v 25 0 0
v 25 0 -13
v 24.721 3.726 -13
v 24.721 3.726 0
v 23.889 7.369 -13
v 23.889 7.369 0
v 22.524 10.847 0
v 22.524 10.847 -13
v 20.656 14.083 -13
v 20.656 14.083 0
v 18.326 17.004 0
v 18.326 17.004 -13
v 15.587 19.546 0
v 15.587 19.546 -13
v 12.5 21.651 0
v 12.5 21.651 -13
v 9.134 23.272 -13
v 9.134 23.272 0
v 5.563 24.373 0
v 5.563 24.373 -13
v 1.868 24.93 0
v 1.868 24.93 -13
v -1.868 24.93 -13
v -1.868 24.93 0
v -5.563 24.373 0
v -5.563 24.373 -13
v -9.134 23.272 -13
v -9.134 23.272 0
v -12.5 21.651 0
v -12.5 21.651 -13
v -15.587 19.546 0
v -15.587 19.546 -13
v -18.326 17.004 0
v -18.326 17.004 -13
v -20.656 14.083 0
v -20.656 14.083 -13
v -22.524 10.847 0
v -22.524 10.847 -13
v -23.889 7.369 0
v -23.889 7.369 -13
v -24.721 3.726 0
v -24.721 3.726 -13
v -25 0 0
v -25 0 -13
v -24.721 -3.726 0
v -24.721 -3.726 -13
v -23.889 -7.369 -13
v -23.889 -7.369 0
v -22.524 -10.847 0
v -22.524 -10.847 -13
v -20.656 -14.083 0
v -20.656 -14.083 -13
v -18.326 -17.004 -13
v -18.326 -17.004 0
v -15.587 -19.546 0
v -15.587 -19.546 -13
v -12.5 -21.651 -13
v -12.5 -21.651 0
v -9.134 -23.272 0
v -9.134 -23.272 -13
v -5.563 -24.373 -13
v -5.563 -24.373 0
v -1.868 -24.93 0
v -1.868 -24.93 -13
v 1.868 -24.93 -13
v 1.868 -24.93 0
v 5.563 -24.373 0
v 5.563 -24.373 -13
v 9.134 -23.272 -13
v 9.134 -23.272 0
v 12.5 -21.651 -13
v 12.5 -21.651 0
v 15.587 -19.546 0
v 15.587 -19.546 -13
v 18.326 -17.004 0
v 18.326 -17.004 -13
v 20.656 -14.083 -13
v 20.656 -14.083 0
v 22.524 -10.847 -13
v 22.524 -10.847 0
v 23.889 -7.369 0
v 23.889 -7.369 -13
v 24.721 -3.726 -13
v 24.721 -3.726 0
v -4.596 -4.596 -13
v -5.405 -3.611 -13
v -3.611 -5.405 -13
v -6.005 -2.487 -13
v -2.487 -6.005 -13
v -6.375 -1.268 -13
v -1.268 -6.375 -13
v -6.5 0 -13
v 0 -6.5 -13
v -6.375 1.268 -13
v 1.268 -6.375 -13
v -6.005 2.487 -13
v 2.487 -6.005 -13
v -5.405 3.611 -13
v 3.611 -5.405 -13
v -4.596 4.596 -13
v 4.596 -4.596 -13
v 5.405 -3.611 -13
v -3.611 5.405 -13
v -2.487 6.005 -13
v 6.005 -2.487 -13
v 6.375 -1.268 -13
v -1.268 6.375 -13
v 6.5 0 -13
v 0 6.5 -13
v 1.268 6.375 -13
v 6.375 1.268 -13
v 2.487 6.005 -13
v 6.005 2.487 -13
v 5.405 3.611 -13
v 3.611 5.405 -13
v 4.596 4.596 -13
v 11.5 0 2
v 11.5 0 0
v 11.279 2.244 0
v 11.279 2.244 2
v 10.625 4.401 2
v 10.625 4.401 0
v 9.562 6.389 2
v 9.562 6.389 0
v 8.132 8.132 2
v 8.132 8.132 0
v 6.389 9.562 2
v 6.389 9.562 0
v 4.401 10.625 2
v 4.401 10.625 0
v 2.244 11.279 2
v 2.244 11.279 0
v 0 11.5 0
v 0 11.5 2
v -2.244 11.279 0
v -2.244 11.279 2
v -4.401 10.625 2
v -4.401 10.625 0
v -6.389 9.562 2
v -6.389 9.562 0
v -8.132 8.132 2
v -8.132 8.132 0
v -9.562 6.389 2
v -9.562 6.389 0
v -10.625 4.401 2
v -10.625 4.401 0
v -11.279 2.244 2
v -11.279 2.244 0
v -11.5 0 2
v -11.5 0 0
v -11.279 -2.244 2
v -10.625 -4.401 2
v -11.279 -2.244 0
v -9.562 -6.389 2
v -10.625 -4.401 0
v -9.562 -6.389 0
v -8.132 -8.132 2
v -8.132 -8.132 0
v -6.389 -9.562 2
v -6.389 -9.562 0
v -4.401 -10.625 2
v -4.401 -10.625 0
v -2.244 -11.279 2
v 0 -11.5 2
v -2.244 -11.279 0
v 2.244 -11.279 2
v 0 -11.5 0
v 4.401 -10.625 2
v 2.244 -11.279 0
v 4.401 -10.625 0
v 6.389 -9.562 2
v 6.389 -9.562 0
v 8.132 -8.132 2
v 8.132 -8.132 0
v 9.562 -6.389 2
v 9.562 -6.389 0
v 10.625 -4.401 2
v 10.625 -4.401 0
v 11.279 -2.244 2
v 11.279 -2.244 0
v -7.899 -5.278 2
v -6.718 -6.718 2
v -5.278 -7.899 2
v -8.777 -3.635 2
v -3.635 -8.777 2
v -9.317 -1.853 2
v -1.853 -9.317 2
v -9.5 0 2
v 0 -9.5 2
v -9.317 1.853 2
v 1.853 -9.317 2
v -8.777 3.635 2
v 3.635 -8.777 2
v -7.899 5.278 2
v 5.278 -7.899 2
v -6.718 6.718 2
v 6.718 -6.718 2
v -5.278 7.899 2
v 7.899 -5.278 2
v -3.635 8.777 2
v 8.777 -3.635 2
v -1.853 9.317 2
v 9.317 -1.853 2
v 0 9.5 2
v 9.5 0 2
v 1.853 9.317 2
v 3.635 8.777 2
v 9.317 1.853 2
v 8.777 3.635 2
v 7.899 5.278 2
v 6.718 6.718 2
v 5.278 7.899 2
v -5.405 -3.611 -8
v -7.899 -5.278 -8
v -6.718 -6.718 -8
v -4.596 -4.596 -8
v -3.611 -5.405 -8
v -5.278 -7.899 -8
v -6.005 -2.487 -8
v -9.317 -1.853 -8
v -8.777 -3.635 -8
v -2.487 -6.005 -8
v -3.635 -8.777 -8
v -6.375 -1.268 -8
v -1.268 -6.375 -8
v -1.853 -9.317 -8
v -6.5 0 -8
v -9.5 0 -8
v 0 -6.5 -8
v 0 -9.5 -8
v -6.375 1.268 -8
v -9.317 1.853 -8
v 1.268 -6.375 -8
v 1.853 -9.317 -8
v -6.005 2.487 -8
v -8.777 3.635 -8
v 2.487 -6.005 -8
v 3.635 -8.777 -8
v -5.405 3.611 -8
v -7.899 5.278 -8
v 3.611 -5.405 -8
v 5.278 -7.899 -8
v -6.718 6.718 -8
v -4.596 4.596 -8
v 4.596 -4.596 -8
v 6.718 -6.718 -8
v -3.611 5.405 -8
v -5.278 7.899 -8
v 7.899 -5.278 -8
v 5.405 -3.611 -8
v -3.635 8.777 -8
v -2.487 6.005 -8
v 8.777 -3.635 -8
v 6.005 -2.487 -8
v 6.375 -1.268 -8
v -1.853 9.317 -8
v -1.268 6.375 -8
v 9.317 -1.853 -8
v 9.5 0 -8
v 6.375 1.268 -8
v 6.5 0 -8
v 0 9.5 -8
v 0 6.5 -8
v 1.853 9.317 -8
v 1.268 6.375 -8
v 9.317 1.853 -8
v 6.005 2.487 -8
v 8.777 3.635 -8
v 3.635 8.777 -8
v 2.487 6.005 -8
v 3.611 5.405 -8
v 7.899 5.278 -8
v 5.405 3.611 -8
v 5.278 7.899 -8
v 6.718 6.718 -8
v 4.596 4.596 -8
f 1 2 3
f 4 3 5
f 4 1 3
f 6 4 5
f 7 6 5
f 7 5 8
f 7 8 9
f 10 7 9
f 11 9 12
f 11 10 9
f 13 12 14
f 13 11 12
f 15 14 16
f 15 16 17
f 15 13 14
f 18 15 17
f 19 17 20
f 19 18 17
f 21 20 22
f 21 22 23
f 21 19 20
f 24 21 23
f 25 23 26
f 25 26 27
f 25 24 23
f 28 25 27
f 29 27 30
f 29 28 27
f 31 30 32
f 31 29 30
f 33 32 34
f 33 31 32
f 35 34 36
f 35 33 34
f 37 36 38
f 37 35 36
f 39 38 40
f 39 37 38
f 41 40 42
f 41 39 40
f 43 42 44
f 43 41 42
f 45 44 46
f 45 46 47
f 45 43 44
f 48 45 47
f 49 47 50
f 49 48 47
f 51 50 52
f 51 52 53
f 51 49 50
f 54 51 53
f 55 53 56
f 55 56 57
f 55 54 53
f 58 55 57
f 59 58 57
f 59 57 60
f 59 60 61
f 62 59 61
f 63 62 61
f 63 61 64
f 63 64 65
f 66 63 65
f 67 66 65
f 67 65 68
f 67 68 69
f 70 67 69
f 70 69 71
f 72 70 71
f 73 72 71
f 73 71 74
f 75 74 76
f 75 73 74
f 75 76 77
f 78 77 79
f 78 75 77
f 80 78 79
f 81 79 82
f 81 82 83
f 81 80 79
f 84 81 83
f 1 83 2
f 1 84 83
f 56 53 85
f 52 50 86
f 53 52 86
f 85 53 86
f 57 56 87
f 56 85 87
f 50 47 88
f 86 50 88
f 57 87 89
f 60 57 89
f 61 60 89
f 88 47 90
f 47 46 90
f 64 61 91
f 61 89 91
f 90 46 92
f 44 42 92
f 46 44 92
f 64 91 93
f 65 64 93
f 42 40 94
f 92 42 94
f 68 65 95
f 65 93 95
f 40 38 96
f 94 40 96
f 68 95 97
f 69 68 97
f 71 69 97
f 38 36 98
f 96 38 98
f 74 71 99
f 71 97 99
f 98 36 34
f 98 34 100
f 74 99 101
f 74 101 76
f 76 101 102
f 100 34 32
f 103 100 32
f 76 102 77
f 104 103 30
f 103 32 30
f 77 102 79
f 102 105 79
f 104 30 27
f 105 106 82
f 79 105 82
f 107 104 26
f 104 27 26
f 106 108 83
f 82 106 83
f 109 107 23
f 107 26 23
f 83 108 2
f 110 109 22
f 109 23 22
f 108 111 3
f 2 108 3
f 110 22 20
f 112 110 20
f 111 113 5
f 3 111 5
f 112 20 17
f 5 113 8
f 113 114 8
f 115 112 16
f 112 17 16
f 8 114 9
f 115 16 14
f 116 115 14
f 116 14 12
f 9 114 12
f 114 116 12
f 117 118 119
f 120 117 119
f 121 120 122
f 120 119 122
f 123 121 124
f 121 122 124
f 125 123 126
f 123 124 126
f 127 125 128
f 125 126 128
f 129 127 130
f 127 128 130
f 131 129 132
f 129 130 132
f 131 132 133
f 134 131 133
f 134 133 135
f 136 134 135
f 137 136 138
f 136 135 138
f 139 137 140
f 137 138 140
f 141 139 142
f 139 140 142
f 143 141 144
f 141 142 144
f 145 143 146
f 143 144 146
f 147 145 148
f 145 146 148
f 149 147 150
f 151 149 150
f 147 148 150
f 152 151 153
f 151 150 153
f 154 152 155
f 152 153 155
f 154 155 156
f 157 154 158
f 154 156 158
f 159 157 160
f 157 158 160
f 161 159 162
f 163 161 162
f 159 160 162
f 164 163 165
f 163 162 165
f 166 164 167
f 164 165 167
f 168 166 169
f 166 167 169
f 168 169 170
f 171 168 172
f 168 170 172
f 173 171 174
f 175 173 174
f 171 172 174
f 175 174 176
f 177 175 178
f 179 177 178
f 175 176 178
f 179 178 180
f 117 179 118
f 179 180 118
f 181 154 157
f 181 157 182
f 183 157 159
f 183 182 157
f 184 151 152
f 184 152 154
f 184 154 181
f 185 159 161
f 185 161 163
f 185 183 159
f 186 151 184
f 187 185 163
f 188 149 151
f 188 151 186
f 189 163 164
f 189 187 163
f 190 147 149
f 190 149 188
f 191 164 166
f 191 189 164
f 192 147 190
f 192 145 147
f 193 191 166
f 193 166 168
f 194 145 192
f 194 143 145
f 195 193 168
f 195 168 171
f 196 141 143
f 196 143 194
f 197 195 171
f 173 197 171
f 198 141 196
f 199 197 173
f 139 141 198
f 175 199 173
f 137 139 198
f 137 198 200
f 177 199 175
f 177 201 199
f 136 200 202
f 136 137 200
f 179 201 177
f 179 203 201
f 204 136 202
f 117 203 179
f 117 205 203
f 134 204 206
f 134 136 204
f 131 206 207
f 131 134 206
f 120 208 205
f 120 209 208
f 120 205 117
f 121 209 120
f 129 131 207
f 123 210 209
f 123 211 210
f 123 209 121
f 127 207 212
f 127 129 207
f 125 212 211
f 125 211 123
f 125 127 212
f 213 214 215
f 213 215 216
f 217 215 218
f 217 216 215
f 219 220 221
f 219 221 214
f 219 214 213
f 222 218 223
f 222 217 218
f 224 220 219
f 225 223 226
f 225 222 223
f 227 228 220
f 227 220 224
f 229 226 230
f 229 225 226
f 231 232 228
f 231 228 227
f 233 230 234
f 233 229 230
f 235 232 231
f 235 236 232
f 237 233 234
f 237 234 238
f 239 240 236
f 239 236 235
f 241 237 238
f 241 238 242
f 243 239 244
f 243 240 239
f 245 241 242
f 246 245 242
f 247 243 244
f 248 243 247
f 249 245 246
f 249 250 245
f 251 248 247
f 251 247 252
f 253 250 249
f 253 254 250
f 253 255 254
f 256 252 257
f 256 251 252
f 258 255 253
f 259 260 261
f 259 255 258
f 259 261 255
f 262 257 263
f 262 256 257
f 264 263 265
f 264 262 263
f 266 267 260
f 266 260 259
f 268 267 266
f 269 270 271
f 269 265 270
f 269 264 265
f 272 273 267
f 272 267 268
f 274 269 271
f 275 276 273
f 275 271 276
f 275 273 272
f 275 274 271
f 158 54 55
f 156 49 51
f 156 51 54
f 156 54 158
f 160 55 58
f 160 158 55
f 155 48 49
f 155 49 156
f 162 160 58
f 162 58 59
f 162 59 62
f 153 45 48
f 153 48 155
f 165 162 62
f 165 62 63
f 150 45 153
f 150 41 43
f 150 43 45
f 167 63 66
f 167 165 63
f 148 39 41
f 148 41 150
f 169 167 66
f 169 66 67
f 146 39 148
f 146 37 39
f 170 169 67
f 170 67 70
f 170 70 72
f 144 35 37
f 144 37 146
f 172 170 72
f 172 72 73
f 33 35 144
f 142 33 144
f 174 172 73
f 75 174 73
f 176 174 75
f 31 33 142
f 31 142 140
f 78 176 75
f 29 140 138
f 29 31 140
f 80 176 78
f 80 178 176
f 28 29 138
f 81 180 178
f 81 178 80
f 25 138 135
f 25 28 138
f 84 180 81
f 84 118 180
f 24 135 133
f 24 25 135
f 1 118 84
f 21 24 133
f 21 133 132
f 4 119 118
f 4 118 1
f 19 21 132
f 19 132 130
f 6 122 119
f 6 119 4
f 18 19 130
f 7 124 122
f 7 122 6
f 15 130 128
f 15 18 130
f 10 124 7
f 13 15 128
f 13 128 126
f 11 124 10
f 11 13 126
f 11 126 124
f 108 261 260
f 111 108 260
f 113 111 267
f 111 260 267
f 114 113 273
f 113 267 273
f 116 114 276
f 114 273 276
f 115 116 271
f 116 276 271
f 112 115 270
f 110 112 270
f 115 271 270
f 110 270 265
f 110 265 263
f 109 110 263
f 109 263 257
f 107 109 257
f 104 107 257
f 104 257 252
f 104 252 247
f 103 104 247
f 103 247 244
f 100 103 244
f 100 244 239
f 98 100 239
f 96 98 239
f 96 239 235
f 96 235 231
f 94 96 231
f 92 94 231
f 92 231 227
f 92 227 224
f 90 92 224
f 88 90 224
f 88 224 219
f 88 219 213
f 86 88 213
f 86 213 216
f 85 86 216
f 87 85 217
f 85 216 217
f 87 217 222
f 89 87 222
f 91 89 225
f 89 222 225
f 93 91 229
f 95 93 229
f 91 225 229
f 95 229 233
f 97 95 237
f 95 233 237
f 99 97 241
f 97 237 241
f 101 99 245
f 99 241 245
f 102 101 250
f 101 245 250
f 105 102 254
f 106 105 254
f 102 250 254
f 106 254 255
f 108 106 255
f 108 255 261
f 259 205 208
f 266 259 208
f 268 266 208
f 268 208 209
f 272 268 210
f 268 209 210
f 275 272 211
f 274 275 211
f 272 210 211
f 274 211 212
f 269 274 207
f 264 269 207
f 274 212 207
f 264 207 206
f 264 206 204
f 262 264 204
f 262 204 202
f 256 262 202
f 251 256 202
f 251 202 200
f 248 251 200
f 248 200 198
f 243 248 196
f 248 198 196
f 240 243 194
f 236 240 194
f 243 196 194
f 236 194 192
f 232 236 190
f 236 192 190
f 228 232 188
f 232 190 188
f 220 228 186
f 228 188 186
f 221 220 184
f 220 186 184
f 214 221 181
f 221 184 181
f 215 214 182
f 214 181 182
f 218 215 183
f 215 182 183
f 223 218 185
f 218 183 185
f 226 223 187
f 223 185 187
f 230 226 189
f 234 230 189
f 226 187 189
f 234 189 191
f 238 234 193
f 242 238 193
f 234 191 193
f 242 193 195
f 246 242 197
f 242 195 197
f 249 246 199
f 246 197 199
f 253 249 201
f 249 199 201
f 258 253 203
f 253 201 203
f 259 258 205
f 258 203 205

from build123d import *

# Parameters (mm, degrees)
CROQUIS1_R              = 25
SALIENTE_EXTRUIR1_DEPTH = 13
CROQUIS2_R              = 11.5
SALIENTE_EXTRUIR2_DEPTH = 2
CROQUIS3_R              = 9.5
CORTAR_EXTRUIR1_DEPTH   = 10
CROQUIS4_R              = 6.5
CORTAR_EXTRUIR2_DEPTH   = 37.742346142


with BuildPart() as part:
    # Croquis1 → Saliente-Extruir1 (new body)
    with BuildSketch(Plane.XY):
        Circle(CROQUIS1_R)
    extrude(amount=-SALIENTE_EXTRUIR1_DEPTH)

    # Croquis2 → Saliente-Extruir2 (add)
    with BuildSketch(Plane.XY):
        Circle(CROQUIS2_R)
    extrude(amount=SALIENTE_EXTRUIR2_DEPTH)

    # Croquis3 → Cortar-Extruir1 (cut)
    with BuildSketch(Plane.XY.offset(2)):
        Circle(CROQUIS3_R)
    extrude(amount=-CORTAR_EXTRUIR1_DEPTH, mode=Mode.SUBTRACT)

    # Croquis4 → Cortar-Extruir2 (cut, through all)
    with BuildSketch(Plane.XY.offset(-8)):
        Circle(CROQUIS4_R)
    extrude(amount=-CORTAR_EXTRUIR2_DEPTH, mode=Mode.SUBTRACT)


solid = part.part
